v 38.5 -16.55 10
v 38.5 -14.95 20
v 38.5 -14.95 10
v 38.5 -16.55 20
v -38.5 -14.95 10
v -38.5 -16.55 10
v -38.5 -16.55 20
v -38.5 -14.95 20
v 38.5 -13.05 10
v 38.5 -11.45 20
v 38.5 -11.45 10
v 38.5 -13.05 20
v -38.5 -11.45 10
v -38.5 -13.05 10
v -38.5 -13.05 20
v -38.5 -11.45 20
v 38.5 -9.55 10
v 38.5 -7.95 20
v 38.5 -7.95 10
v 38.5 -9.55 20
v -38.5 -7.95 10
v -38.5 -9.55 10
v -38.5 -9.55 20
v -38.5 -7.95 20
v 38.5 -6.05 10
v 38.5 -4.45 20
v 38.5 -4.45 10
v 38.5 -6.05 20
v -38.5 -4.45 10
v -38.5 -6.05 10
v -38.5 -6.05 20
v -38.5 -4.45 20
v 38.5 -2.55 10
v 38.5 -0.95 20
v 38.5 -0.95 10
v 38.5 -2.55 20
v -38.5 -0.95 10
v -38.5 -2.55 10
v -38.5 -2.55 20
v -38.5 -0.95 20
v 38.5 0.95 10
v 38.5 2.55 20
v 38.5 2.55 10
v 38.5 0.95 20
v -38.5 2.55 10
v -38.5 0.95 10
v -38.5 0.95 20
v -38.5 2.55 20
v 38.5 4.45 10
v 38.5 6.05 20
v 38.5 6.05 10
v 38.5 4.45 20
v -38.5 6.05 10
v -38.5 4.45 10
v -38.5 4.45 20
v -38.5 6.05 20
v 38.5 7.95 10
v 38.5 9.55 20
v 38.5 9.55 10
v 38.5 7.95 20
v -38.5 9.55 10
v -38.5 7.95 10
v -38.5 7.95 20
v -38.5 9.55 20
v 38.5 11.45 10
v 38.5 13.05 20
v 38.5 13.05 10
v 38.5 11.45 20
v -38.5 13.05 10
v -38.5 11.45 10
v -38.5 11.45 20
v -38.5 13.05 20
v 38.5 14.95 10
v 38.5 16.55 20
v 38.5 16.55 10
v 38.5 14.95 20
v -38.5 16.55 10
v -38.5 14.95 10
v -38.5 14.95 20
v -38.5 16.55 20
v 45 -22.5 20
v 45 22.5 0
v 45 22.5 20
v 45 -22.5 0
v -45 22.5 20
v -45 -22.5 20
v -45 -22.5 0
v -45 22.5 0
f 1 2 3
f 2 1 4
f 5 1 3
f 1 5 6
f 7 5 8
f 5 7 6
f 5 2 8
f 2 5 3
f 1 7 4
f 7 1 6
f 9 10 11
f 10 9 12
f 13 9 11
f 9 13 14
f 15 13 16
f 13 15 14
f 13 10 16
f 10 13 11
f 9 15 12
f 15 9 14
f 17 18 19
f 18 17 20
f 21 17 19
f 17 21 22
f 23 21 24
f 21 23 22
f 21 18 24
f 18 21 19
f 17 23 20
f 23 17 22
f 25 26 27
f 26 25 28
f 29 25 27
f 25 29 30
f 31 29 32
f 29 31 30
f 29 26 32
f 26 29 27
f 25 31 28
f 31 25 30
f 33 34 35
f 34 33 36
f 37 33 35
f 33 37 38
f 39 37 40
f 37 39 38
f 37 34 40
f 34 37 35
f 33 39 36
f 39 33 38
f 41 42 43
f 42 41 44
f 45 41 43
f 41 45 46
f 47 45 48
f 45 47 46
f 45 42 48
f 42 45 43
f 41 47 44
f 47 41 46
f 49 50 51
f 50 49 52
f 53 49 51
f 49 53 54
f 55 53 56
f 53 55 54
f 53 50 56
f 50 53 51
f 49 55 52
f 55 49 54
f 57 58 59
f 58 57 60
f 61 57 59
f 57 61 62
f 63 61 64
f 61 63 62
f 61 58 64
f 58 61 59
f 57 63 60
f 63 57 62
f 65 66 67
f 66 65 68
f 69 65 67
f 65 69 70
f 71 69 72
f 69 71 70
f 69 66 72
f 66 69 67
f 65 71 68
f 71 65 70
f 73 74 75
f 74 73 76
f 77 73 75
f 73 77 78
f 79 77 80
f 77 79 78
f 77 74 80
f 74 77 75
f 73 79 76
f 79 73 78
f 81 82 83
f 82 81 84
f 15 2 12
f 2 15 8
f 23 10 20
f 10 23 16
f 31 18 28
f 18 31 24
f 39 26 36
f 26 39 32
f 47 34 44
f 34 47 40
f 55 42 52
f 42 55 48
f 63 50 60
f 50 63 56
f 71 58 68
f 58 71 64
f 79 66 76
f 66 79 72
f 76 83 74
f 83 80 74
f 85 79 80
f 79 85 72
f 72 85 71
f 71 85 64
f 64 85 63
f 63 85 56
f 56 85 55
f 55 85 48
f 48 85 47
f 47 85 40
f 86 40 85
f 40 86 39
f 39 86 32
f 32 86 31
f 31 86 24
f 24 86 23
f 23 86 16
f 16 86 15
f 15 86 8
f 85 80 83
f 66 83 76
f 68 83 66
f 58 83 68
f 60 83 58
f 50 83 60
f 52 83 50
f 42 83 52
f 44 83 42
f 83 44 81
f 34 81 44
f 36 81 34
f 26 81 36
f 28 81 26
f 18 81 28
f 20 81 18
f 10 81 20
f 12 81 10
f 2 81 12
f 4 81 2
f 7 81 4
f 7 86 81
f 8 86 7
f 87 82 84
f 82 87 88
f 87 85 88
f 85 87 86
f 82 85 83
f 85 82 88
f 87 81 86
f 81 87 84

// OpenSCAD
// Slide drying rack - holds 10 microscope slides standing upright on their long edge
// Print orientation: base block on the XY plane, slots open upward (+Z)

// ---------------- Parameters ----------------
block_len    = 90;    // base block length along X (mm)
block_wid    = 45;    // base block width along Y (mm)
block_ht     = 20;    // base block height along Z (mm)

slot_count   = 10;    // number of slide slots
slot_len     = 77;    // slot length along X (mm)
slot_wid     = 1.6;   // slot width along Y (mm)
slot_depth   = 10;    // slot depth from top face (mm)
slot_pitch   = 3.5;   // centre-to-centre spacing of slots along Y (mm)

eps          = 0.5;   // overshoot of cutters past the top face (mm)

$fn = 64;

// ---------------- Model ----------------
difference() {
    // Solid base block, centred in X and Y, resting on z = 0
    translate([-block_len/2, -block_wid/2, 0])
        cube([block_len, block_wid, block_ht]);

    // Row of parallel slots, centred on the block in X and Y
    for (i = [0 : slot_count - 1]) {
        y_c = (i - (slot_count - 1)/2) * slot_pitch;
        translate([-slot_len/2, y_c - slot_wid/2, block_ht - slot_depth])
            cube([slot_len, slot_wid, slot_depth + eps]);
    }
}
